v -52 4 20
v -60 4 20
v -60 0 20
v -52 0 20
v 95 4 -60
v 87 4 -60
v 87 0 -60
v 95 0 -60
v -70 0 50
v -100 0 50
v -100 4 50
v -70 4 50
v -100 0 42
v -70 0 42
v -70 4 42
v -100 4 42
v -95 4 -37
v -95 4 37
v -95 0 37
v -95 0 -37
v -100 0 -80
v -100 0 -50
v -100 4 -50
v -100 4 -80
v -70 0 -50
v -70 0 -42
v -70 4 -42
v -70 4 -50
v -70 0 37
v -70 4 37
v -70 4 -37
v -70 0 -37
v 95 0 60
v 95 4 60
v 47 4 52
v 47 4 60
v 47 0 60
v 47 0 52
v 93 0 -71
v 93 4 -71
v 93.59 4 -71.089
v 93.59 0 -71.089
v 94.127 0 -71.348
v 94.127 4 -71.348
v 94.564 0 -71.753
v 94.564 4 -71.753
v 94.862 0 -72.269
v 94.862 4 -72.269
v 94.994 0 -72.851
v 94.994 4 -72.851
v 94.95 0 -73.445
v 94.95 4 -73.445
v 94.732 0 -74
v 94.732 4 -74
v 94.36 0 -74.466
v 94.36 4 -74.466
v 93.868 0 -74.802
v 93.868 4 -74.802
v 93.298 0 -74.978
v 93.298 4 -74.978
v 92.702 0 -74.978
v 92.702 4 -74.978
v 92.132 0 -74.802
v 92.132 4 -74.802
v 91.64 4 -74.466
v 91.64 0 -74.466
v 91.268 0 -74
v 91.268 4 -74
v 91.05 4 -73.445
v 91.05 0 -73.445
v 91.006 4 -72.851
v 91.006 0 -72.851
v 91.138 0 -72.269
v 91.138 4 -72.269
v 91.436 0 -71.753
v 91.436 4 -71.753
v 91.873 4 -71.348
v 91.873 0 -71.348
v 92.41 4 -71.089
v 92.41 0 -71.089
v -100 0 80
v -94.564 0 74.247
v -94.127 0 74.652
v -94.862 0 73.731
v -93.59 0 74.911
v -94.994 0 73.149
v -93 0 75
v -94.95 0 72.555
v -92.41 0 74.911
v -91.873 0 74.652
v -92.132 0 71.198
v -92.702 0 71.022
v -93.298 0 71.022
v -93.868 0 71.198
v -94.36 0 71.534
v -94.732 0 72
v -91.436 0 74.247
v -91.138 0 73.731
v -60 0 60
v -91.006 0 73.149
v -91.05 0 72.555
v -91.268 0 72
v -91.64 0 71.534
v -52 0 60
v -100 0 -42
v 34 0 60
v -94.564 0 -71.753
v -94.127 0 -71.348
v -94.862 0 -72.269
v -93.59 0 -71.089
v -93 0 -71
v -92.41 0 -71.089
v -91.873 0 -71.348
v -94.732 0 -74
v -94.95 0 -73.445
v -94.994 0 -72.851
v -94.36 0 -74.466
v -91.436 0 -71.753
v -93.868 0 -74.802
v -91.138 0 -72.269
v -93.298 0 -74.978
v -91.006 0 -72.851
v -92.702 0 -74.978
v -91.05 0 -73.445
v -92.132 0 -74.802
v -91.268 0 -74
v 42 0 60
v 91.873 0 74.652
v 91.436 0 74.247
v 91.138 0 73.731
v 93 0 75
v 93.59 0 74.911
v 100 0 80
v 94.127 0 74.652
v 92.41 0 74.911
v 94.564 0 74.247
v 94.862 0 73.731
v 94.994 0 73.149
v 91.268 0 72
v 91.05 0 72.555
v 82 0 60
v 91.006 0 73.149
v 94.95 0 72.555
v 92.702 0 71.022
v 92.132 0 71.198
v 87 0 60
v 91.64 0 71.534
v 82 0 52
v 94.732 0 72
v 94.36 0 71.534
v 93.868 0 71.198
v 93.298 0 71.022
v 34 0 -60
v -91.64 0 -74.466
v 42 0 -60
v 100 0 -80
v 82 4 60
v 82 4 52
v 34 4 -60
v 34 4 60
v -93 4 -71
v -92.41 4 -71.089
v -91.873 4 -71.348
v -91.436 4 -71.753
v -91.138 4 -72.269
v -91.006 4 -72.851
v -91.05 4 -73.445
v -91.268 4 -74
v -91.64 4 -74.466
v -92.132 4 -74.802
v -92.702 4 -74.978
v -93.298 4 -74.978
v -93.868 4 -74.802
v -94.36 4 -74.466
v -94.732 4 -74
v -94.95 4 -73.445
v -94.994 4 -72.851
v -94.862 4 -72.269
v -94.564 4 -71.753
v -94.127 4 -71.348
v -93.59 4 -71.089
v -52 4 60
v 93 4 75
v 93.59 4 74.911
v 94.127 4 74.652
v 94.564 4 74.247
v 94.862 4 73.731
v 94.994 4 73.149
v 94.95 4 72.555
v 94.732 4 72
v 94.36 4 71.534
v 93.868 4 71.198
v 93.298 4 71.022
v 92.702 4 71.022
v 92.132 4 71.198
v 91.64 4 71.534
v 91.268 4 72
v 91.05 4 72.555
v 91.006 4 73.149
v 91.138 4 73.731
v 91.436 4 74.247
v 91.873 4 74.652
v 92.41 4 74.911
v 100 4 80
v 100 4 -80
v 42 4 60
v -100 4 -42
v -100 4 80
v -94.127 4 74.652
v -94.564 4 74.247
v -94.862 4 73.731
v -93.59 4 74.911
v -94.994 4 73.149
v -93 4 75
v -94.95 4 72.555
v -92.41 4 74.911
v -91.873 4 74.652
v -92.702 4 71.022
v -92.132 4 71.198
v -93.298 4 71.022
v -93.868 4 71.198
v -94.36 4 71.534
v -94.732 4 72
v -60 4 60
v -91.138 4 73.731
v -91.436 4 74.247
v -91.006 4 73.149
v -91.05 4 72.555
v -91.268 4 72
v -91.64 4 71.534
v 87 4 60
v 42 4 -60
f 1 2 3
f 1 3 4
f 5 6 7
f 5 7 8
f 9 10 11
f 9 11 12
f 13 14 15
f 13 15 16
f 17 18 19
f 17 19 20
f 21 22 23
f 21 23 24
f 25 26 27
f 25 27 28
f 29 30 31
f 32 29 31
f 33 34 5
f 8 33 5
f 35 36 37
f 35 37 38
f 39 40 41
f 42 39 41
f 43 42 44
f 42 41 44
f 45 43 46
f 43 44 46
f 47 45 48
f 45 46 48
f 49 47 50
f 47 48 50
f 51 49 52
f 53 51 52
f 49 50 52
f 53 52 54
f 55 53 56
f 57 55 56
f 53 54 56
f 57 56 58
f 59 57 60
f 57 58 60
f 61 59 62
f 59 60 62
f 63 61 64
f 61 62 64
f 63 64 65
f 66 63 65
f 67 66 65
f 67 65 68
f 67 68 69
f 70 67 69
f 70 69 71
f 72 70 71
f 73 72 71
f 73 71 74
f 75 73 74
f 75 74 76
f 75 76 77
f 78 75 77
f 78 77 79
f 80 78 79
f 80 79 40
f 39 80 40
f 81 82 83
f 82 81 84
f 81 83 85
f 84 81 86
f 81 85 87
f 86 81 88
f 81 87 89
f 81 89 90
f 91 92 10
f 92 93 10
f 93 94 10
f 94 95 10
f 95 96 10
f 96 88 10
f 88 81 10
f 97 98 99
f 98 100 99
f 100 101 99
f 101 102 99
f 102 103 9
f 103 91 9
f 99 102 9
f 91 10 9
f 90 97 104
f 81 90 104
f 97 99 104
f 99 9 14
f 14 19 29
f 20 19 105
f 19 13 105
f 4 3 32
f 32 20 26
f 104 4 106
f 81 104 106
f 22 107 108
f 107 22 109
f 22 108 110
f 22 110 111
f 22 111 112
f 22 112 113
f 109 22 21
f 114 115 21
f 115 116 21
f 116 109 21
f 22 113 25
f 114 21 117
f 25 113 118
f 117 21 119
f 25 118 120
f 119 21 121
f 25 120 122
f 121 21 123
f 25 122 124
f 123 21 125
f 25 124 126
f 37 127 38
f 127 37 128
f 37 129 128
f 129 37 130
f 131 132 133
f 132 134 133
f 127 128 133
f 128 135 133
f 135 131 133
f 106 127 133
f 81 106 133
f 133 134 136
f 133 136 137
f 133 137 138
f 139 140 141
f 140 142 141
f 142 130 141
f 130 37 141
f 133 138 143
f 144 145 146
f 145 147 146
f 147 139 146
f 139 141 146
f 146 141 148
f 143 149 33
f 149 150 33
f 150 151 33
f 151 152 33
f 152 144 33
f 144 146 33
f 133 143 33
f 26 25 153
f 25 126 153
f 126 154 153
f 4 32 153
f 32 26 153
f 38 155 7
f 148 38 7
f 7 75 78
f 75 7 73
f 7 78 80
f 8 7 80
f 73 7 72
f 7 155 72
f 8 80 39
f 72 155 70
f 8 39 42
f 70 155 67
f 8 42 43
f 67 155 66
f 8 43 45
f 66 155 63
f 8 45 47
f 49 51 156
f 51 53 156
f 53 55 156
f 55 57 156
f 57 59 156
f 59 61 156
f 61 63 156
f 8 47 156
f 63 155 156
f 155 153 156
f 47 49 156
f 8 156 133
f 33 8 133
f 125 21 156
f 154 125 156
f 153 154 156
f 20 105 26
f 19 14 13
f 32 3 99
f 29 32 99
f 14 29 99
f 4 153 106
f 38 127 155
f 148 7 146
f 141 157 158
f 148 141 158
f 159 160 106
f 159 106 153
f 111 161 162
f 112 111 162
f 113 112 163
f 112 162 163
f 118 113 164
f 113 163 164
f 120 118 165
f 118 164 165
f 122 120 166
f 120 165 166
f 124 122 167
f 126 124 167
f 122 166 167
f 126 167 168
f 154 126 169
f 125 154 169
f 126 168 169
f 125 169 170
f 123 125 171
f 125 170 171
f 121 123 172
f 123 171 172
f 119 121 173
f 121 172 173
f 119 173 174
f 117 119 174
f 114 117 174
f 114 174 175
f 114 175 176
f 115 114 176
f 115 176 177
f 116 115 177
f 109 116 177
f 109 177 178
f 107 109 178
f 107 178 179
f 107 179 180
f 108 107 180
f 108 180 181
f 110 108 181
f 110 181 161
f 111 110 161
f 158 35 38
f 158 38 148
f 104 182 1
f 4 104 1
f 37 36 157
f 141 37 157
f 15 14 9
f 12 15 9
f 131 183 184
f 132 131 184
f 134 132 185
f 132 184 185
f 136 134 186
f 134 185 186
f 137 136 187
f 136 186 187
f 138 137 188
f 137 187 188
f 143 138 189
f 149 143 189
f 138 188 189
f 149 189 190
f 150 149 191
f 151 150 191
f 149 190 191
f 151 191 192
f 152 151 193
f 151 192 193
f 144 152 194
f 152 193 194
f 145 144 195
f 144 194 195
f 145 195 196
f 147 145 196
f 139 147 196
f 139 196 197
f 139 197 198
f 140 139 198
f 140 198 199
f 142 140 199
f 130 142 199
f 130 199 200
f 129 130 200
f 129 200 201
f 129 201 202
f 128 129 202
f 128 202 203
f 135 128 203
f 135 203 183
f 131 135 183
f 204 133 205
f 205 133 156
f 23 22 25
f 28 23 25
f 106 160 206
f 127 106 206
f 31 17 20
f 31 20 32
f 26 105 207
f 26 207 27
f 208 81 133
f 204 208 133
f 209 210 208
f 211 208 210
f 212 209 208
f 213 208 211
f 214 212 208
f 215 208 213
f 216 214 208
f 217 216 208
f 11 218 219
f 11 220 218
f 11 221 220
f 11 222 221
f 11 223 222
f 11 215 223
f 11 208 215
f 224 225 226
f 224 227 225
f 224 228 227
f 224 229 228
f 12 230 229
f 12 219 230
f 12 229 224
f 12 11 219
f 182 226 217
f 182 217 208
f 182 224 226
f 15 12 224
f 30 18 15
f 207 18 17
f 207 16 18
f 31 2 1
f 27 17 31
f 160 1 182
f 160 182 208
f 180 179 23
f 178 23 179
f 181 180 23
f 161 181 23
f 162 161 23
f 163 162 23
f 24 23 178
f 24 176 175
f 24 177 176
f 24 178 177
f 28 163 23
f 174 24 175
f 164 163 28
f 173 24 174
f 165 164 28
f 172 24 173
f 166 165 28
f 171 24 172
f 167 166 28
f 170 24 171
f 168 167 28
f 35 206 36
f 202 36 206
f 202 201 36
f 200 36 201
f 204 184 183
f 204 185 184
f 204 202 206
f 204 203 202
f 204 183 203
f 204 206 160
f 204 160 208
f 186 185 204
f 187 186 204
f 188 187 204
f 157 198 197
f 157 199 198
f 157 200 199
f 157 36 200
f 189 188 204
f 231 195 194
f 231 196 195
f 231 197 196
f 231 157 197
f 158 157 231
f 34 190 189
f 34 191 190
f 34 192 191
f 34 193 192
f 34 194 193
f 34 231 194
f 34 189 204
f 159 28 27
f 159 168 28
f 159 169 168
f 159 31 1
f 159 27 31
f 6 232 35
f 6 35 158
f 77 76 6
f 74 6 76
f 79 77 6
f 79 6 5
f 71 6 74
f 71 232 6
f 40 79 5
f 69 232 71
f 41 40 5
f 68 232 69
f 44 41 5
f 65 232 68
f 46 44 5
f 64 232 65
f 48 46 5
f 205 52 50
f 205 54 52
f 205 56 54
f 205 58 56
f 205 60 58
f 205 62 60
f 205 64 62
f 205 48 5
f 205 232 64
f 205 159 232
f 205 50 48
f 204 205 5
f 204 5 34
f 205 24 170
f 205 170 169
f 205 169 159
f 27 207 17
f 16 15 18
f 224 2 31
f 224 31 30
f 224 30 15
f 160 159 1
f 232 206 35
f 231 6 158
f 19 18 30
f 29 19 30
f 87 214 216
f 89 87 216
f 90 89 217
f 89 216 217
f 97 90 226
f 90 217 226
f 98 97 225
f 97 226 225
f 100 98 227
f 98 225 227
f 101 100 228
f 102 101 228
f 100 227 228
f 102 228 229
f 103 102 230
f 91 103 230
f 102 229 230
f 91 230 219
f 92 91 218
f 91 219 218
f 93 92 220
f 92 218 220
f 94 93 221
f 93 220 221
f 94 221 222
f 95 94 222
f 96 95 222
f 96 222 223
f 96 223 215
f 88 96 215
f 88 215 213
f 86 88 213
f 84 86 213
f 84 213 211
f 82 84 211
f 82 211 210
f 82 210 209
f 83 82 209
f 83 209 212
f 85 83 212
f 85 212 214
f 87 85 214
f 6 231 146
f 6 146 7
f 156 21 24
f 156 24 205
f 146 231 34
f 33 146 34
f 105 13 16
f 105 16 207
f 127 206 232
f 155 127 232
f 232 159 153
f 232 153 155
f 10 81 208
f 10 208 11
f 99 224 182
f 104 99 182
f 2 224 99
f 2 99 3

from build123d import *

# Parameters (mm, degrees)
SKETCH3_W               = 200
SKETCH3_H               = 160
BOSS_EXTRUDE1_DEPTH     = 4
SKETCH4_R               = 2
CUT_EXTRUDE1_DEPTH      = 129.124939024
CUT_EXTRUDE3_DEPTH      = 129.124939024
CUT_EXTRUDE3_DEPTH_BACK = 129.124939024
SKETCH5_W               = 30
SKETCH5_H               = 8
SKETCH7_W               = 25
SKETCH7_H               = 74
CUT_EXTRUDE4_DEPTH      = 129.124939024
CUT_EXTRUDE6_DEPTH      = 129.124939024
CUT_EXTRUDE6_DEPTH_BACK = 4
SKETCH12_W              = 8
SKETCH12_H              = 120
CUT_EXTRUDE8_DEPTH      = 129.124939024
SKETCH14_W              = 8
SKETCH14_H              = 120
CUT_EXTRUDE9_DEPTH      = 129.124939024
SKETCH15_W              = 8
SKETCH15_H              = 40
CUT_EXTRUDE10_DEPTH     = 129.124939024
SKETCH16_W              = 35
SKETCH16_H              = 8
CUT_EXTRUDE11_DEPTH     = 129.124939024


with BuildPart() as part:
    # Sketch3 → Boss-Extrude1 (new body)
    with BuildSketch(Plane(origin=(0, 0, 0), x_dir=(1, 0, 0), z_dir=(0, 1, 0))):
        Rectangle(SKETCH3_W, SKETCH3_H)
    extrude(amount=BOSS_EXTRUDE1_DEPTH)

    # Sketch4 → Cut-Extrude1 (cut, through all)
    with BuildSketch(Plane(origin=(0, 4, 0), x_dir=(1, 0, 0), z_dir=(0, 1, 0))):
        with Locations(Location((-93, 73, 0), (0, 0, 270))):
            Circle(SKETCH4_R)
        with Locations(Location((93, 73, 0), (0, 0, 270))):
            Circle(SKETCH4_R)
        with Locations(Location((-93, -73, 0), (0, 0, 270))):
            Circle(SKETCH4_R)
        with Locations(Location((93, -73, 0), (0, 0, 270))):
            Circle(SKETCH4_R)
    extrude(amount=-CUT_EXTRUDE1_DEPTH, mode=Mode.SUBTRACT)

    # Sketch5 → Cut-Extrude3 (cut, two sides: drawn at the far end of the back side and taken through both)
    with BuildSketch(Plane(origin=(0, 4, 0), x_dir=(1, 0, 0), z_dir=(0, 1, 0)).offset(-CUT_EXTRUDE3_DEPTH_BACK)):
        with Locations((-85, 46)):
            Rectangle(SKETCH5_W, SKETCH5_H)
    extrude(amount=CUT_EXTRUDE3_DEPTH + CUT_EXTRUDE3_DEPTH_BACK, mode=Mode.SUBTRACT)

    # Sketch7 → Cut-Extrude4 (cut, through all)
    with BuildSketch(Plane(origin=(0, 4, 0), x_dir=(1, 0, 0), z_dir=(0, 1, 0))):
        with Locations((-82.5, 0)):
            Rectangle(SKETCH7_W, SKETCH7_H)
    extrude(amount=-CUT_EXTRUDE4_DEPTH, mode=Mode.SUBTRACT)

    # Sketch11 → Cut-Extrude6 (cut, two sides: drawn at the far end of the back side and taken through both)
    with BuildSketch(Plane(origin=(0, 4, 0), x_dir=(1, 0, 0), z_dir=(0, 1, 0)).offset(-CUT_EXTRUDE6_DEPTH_BACK)):
        Polygon((-587.074417675, -42), (-100, -42), (-70, -42), (-70, -50), (-100, -50), (-587.074417675, -50), (-1561.223253025, -50), (-1561.223253025, -42), align=None)
    extrude(amount=CUT_EXTRUDE6_DEPTH + CUT_EXTRUDE6_DEPTH_BACK, mode=Mode.SUBTRACT)

    # Sketch12 → Cut-Extrude8 (cut, through all)
    with BuildSketch(Plane(origin=(0, 4, 0), x_dir=(1, 0, 0), z_dir=(0, 1, 0))):
        with Locations((91, 0)):
            Rectangle(SKETCH12_W, SKETCH12_H)
    extrude(amount=-CUT_EXTRUDE8_DEPTH, mode=Mode.SUBTRACT)

    # Sketch14 → Cut-Extrude9 (cut, through all)
    with BuildSketch(Plane(origin=(0, 4, 0), x_dir=(1, 0, 0), z_dir=(0, 1, 0))):
        with Locations((38, 0)):
            Rectangle(SKETCH14_W, SKETCH14_H)
    extrude(amount=-CUT_EXTRUDE9_DEPTH, mode=Mode.SUBTRACT)

    # Sketch15 → Cut-Extrude10 (cut, through all)
    with BuildSketch(Plane(origin=(0, 4, 0), x_dir=(1, 0, 0), z_dir=(0, 1, 0))):
        with Locations((-56, -40)):
            Rectangle(SKETCH15_W, SKETCH15_H)
    extrude(amount=-CUT_EXTRUDE10_DEPTH, mode=Mode.SUBTRACT)

    # Sketch16 → Cut-Extrude11 (cut, through all)
    with BuildSketch(Plane(origin=(0, 4, 0), x_dir=(1, 0, 0), z_dir=(0, 1, 0))):
        with Locations((64.5, -56)):
            Rectangle(SKETCH16_W, SKETCH16_H)
    extrude(amount=-CUT_EXTRUDE11_DEPTH, mode=Mode.SUBTRACT)


solid = part.part
